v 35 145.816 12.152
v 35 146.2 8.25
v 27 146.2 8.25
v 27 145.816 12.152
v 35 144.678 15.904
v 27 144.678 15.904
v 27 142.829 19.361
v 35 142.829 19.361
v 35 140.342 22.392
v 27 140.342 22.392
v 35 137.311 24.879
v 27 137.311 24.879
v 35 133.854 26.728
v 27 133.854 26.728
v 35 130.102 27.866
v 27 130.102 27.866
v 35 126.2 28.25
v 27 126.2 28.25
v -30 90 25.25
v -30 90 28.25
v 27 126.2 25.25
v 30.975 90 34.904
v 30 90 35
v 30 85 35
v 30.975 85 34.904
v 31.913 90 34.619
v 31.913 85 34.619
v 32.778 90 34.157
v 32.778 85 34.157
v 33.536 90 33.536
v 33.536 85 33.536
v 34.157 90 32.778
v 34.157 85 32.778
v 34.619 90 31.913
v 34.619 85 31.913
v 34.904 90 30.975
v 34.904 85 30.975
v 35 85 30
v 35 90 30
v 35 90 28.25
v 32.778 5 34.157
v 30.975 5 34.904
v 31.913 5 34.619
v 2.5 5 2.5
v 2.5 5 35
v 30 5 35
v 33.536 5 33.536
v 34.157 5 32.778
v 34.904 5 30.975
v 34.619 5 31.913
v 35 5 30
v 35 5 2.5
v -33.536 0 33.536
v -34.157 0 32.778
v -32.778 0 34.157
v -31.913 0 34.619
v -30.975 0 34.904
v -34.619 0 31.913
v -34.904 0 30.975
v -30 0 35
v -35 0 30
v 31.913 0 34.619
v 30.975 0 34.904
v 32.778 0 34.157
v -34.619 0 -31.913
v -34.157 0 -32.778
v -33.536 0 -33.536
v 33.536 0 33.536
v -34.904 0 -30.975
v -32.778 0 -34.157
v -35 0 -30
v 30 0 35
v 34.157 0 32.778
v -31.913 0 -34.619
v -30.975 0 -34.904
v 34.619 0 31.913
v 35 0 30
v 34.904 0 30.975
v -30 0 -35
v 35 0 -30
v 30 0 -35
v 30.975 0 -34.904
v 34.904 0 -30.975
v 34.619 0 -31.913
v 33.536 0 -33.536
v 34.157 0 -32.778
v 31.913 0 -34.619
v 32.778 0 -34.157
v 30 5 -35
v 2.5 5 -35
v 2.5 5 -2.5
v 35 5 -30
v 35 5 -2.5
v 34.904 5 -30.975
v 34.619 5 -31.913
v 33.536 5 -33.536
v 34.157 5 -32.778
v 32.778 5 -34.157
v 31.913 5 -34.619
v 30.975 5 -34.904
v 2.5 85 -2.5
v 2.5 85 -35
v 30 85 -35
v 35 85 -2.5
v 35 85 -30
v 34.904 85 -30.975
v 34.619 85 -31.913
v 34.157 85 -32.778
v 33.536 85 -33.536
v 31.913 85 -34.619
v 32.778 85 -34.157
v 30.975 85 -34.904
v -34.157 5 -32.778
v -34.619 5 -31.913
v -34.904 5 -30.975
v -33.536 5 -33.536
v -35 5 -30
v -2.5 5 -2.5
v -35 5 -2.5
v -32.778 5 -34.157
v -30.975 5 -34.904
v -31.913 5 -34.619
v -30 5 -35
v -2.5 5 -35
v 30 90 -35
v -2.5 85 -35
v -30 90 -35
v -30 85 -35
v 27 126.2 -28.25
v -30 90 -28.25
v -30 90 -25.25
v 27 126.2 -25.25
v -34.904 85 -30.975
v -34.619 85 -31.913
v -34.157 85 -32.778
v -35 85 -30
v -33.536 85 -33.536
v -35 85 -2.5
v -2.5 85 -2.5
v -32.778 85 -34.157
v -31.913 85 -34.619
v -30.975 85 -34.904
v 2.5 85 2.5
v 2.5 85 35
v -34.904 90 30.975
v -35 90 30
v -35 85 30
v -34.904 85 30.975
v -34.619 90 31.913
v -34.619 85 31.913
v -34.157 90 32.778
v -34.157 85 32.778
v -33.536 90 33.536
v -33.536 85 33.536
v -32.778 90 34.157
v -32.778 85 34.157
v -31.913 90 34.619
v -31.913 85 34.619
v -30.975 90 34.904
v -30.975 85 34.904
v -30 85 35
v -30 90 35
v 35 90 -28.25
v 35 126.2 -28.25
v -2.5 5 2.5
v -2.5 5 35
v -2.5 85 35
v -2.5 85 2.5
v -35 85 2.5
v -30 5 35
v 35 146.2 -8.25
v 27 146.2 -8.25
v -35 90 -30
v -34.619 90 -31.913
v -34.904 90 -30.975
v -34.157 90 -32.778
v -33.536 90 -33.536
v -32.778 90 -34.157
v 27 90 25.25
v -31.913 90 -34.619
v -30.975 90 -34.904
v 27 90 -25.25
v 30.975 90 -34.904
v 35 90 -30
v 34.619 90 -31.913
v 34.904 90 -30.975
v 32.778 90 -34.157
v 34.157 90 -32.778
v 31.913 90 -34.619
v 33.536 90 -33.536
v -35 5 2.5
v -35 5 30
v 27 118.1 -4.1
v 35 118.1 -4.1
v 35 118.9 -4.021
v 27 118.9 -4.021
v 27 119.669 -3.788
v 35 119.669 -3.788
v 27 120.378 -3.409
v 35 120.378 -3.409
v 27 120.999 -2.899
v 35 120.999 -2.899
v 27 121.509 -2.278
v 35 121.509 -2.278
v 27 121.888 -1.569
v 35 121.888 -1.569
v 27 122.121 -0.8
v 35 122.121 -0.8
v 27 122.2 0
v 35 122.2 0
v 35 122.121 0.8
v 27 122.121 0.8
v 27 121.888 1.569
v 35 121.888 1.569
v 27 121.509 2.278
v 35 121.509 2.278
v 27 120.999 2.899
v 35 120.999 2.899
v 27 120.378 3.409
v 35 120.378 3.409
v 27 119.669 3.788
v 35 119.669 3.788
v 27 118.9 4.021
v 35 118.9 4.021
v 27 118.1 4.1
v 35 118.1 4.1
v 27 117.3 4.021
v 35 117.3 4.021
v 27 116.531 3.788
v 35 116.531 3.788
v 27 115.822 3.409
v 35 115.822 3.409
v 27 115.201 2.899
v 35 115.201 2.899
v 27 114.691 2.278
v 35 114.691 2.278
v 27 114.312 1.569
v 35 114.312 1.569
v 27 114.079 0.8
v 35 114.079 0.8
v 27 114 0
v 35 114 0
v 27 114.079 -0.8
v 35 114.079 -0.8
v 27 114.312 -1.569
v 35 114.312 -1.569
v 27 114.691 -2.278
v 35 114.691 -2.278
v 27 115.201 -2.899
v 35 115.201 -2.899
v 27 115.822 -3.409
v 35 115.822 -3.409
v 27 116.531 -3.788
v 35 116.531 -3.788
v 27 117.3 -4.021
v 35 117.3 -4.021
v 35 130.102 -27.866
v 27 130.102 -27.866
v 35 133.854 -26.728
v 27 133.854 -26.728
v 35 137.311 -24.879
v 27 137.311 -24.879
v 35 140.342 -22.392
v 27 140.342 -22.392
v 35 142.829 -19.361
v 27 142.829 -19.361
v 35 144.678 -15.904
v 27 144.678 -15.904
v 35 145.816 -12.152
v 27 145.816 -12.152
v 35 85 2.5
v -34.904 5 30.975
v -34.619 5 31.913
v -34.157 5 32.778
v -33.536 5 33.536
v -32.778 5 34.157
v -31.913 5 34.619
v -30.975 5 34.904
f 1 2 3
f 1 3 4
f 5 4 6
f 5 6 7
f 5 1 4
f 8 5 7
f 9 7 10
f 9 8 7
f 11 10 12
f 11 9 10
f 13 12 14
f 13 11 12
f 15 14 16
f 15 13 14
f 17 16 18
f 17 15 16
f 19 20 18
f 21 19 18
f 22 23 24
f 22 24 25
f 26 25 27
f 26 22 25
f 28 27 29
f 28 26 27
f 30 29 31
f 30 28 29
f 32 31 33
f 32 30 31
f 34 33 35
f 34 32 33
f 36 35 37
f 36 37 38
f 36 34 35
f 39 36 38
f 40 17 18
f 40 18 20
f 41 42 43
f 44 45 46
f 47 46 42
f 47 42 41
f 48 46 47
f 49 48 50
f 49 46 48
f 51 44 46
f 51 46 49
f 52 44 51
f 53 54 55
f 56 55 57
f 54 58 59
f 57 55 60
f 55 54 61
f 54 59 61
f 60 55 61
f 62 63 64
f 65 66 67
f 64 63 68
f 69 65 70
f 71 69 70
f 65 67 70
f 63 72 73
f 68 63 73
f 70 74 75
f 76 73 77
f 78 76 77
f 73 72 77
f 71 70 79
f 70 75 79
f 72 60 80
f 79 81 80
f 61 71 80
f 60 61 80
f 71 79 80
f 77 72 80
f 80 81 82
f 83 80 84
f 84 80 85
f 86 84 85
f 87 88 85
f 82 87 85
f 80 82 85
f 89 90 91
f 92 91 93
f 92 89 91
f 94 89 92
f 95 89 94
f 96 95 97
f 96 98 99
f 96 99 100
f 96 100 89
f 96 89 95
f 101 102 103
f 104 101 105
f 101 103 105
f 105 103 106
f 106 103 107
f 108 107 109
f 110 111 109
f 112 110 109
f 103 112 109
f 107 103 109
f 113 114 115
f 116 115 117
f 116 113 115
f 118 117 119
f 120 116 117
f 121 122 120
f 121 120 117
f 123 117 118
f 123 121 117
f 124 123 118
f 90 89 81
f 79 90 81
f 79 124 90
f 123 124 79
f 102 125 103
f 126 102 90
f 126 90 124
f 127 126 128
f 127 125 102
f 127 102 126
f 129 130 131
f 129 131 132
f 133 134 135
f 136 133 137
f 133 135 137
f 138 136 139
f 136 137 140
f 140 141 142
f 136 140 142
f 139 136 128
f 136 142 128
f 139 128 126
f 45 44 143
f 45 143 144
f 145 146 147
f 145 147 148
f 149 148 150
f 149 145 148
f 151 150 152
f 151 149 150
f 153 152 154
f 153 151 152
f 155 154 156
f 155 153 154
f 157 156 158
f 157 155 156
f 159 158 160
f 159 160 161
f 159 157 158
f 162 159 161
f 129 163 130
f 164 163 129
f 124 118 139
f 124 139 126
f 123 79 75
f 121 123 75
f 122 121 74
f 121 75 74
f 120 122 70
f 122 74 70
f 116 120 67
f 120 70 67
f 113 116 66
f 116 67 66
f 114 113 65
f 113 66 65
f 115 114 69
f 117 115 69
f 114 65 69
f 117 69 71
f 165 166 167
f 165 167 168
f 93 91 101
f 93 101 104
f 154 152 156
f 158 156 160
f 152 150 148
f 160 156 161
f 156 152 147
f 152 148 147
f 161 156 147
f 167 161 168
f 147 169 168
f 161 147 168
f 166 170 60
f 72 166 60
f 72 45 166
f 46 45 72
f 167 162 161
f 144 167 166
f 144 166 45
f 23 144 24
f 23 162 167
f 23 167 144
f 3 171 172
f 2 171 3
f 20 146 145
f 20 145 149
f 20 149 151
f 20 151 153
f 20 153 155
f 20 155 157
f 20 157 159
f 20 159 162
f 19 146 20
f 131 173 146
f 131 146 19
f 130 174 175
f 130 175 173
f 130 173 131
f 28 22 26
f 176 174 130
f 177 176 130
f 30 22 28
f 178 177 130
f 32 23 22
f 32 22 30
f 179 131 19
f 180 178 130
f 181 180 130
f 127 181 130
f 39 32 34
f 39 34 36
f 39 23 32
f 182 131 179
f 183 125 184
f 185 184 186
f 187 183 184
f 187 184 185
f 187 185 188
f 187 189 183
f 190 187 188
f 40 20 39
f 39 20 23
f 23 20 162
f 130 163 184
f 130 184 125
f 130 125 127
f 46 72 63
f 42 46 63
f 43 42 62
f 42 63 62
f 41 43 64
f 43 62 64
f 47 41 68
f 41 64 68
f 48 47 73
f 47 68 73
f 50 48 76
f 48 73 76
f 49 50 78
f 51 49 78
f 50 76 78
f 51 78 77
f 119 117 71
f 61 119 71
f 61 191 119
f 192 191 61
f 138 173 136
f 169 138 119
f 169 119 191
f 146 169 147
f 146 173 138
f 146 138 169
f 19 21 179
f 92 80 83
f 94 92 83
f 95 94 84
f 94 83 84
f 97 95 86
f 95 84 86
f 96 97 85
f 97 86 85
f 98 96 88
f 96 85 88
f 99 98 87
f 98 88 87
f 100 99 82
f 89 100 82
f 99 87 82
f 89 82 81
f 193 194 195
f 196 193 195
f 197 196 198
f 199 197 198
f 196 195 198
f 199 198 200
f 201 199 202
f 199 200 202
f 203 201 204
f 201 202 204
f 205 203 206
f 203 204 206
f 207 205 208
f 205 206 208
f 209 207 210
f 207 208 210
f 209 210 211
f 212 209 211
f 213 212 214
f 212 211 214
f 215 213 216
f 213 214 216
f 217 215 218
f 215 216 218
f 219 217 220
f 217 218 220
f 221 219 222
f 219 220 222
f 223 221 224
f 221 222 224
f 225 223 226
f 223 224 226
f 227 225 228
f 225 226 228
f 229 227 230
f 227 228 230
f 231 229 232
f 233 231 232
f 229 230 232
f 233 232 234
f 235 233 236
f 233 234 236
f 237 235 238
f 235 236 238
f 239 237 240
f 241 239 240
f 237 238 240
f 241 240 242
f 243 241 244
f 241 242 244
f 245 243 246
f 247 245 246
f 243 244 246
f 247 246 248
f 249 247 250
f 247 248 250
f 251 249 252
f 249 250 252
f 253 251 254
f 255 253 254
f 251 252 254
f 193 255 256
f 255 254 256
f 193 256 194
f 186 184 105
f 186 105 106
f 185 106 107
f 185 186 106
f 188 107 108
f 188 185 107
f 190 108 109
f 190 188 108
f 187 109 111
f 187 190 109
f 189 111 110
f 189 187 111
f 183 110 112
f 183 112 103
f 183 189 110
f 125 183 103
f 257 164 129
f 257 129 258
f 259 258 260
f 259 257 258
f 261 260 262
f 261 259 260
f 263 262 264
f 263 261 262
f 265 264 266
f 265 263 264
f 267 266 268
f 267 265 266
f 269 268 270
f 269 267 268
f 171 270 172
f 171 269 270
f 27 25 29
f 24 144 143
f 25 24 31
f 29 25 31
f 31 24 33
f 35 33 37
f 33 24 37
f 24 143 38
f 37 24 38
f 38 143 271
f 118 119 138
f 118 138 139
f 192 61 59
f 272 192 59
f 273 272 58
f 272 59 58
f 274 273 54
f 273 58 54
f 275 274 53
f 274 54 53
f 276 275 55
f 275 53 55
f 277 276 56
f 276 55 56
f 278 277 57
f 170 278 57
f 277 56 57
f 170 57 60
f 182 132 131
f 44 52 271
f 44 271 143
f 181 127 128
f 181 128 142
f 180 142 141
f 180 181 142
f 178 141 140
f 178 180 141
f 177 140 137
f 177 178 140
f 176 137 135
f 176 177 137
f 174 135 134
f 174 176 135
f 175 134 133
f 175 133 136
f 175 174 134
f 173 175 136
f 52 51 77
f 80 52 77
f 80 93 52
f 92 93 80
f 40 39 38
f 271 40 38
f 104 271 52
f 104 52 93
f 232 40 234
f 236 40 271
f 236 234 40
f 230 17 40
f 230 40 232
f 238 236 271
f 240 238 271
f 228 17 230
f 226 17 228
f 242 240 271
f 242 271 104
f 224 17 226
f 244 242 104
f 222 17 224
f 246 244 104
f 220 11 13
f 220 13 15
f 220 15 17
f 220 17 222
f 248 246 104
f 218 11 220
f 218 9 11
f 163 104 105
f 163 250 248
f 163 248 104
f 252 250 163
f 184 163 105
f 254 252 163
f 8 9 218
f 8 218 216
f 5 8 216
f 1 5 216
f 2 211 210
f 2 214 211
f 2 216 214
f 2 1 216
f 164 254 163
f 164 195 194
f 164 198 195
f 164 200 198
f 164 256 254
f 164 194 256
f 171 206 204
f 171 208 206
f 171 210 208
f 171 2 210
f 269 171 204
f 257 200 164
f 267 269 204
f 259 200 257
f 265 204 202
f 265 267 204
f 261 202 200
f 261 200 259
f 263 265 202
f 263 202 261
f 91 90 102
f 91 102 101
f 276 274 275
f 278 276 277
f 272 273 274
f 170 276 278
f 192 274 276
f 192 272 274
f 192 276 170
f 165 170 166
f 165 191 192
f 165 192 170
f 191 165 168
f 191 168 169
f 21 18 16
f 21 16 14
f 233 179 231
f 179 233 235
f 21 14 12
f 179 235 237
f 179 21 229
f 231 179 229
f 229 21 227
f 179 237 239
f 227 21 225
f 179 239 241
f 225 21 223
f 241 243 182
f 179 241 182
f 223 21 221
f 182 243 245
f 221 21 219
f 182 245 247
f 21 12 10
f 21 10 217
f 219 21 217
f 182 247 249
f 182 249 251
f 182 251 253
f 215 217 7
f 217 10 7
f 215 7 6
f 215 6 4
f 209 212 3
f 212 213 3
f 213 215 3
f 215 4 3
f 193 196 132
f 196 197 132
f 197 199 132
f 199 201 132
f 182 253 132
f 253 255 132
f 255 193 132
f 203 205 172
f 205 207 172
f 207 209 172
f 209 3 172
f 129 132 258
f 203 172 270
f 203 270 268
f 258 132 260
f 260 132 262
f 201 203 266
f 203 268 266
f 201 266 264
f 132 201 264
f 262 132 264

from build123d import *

# Parameters (mm, degrees)
BOSS_EXTRUDE1_DEPTH = 5
BOSS_EXTRUDE2_DEPTH = 80
SKETCH4_R           = 4.1
BOSS_EXTRUDE3_DEPTH = 8
BOSS_EXTRUDE4_DEPTH = 3


with BuildPart() as part:
    # Sketch2 → Boss-Extrude1 (new body)
    with BuildSketch(Plane(origin=(0, 0, 0), x_dir=(1, 0, 0), z_dir=(0, 1, 0))):
        with BuildLine():
            Line((-30, -35), (30, -35))
            ThreePointArc((30, -35), (33.535533906, -33.535533906), (35, -30))
            Line((35, -30), (35, 30))
            ThreePointArc((35, 30), (33.535533906, 33.535533906), (30, 35))
            Line((30, 35), (-30, 35))
            ThreePointArc((-30, 35), (-33.535533906, 33.535533906), (-35, 30))
            Line((-35, 30), (-35, -30))
            ThreePointArc((-35, -30), (-33.535533906, -33.535533906), (-30, -35))
        make_face()
    boss_extrude1 = extrude(amount=BOSS_EXTRUDE1_DEPTH)

    # Sketch3 → Boss-Extrude2 (add)
    with BuildSketch(Plane(origin=(0, 5, 0), x_dir=(1, 0, 0), z_dir=(0, 1, 0))):
        Polygon((-2.5, 2.5), (-2.5, 35), (2.5, 35), (2.5, 2.5), (35, 2.5), (35, -2.5), (2.5, -2.5), (2.5, -35), (-2.5, -35), (-2.5, -2.5), (-35, -2.5), (-35, 2.5), align=None)
    extrude(amount=BOSS_EXTRUDE2_DEPTH)

    # Mirror1: Boss-Extrude1 across plane
    add(boss_extrude1.mirror(Plane.ZX.offset(45)))

    # Sketch4 → Boss-Extrude3 (add)
    with BuildSketch(Plane(origin=(35, 0, 0), x_dir=(0, 0, -1), z_dir=(1, 0, 0))):
        with BuildLine():
            Line((-28.25, 90), (28.25, 90))
            Line((28.25, 90), (28.25, 126.2))
            ThreePointArc((28.25, 126.2), (22.392135624, 140.342135624), (8.25, 146.2))
            Line((8.25, 146.2), (-8.25, 146.2))
            ThreePointArc((-8.25, 146.2), (-22.392135624, 140.342135624), (-28.25, 126.2))
            Line((-28.25, 126.2), (-28.25, 90))
        make_face()
        with Locations((0, 118.1)):
            Circle(SKETCH4_R, mode=Mode.SUBTRACT)
    extrude(amount=-BOSS_EXTRUDE3_DEPTH)

    # Sketch5 → Boss-Extrude4 (add)
    with BuildSketch(Plane.XY.offset(28.25)):
        Polygon((35, 90), (-30, 90), (27, 126.2), (35, 126.2), align=None)
    boss_extrude4 = extrude(amount=-BOSS_EXTRUDE4_DEPTH)

    # Mirror2: Boss-Extrude4 across plane
    add(boss_extrude4.mirror(Plane(origin=(0, 0, 0), x_dir=(1, 0, 0), z_dir=(0, 0, -1))))


solid = part.part
